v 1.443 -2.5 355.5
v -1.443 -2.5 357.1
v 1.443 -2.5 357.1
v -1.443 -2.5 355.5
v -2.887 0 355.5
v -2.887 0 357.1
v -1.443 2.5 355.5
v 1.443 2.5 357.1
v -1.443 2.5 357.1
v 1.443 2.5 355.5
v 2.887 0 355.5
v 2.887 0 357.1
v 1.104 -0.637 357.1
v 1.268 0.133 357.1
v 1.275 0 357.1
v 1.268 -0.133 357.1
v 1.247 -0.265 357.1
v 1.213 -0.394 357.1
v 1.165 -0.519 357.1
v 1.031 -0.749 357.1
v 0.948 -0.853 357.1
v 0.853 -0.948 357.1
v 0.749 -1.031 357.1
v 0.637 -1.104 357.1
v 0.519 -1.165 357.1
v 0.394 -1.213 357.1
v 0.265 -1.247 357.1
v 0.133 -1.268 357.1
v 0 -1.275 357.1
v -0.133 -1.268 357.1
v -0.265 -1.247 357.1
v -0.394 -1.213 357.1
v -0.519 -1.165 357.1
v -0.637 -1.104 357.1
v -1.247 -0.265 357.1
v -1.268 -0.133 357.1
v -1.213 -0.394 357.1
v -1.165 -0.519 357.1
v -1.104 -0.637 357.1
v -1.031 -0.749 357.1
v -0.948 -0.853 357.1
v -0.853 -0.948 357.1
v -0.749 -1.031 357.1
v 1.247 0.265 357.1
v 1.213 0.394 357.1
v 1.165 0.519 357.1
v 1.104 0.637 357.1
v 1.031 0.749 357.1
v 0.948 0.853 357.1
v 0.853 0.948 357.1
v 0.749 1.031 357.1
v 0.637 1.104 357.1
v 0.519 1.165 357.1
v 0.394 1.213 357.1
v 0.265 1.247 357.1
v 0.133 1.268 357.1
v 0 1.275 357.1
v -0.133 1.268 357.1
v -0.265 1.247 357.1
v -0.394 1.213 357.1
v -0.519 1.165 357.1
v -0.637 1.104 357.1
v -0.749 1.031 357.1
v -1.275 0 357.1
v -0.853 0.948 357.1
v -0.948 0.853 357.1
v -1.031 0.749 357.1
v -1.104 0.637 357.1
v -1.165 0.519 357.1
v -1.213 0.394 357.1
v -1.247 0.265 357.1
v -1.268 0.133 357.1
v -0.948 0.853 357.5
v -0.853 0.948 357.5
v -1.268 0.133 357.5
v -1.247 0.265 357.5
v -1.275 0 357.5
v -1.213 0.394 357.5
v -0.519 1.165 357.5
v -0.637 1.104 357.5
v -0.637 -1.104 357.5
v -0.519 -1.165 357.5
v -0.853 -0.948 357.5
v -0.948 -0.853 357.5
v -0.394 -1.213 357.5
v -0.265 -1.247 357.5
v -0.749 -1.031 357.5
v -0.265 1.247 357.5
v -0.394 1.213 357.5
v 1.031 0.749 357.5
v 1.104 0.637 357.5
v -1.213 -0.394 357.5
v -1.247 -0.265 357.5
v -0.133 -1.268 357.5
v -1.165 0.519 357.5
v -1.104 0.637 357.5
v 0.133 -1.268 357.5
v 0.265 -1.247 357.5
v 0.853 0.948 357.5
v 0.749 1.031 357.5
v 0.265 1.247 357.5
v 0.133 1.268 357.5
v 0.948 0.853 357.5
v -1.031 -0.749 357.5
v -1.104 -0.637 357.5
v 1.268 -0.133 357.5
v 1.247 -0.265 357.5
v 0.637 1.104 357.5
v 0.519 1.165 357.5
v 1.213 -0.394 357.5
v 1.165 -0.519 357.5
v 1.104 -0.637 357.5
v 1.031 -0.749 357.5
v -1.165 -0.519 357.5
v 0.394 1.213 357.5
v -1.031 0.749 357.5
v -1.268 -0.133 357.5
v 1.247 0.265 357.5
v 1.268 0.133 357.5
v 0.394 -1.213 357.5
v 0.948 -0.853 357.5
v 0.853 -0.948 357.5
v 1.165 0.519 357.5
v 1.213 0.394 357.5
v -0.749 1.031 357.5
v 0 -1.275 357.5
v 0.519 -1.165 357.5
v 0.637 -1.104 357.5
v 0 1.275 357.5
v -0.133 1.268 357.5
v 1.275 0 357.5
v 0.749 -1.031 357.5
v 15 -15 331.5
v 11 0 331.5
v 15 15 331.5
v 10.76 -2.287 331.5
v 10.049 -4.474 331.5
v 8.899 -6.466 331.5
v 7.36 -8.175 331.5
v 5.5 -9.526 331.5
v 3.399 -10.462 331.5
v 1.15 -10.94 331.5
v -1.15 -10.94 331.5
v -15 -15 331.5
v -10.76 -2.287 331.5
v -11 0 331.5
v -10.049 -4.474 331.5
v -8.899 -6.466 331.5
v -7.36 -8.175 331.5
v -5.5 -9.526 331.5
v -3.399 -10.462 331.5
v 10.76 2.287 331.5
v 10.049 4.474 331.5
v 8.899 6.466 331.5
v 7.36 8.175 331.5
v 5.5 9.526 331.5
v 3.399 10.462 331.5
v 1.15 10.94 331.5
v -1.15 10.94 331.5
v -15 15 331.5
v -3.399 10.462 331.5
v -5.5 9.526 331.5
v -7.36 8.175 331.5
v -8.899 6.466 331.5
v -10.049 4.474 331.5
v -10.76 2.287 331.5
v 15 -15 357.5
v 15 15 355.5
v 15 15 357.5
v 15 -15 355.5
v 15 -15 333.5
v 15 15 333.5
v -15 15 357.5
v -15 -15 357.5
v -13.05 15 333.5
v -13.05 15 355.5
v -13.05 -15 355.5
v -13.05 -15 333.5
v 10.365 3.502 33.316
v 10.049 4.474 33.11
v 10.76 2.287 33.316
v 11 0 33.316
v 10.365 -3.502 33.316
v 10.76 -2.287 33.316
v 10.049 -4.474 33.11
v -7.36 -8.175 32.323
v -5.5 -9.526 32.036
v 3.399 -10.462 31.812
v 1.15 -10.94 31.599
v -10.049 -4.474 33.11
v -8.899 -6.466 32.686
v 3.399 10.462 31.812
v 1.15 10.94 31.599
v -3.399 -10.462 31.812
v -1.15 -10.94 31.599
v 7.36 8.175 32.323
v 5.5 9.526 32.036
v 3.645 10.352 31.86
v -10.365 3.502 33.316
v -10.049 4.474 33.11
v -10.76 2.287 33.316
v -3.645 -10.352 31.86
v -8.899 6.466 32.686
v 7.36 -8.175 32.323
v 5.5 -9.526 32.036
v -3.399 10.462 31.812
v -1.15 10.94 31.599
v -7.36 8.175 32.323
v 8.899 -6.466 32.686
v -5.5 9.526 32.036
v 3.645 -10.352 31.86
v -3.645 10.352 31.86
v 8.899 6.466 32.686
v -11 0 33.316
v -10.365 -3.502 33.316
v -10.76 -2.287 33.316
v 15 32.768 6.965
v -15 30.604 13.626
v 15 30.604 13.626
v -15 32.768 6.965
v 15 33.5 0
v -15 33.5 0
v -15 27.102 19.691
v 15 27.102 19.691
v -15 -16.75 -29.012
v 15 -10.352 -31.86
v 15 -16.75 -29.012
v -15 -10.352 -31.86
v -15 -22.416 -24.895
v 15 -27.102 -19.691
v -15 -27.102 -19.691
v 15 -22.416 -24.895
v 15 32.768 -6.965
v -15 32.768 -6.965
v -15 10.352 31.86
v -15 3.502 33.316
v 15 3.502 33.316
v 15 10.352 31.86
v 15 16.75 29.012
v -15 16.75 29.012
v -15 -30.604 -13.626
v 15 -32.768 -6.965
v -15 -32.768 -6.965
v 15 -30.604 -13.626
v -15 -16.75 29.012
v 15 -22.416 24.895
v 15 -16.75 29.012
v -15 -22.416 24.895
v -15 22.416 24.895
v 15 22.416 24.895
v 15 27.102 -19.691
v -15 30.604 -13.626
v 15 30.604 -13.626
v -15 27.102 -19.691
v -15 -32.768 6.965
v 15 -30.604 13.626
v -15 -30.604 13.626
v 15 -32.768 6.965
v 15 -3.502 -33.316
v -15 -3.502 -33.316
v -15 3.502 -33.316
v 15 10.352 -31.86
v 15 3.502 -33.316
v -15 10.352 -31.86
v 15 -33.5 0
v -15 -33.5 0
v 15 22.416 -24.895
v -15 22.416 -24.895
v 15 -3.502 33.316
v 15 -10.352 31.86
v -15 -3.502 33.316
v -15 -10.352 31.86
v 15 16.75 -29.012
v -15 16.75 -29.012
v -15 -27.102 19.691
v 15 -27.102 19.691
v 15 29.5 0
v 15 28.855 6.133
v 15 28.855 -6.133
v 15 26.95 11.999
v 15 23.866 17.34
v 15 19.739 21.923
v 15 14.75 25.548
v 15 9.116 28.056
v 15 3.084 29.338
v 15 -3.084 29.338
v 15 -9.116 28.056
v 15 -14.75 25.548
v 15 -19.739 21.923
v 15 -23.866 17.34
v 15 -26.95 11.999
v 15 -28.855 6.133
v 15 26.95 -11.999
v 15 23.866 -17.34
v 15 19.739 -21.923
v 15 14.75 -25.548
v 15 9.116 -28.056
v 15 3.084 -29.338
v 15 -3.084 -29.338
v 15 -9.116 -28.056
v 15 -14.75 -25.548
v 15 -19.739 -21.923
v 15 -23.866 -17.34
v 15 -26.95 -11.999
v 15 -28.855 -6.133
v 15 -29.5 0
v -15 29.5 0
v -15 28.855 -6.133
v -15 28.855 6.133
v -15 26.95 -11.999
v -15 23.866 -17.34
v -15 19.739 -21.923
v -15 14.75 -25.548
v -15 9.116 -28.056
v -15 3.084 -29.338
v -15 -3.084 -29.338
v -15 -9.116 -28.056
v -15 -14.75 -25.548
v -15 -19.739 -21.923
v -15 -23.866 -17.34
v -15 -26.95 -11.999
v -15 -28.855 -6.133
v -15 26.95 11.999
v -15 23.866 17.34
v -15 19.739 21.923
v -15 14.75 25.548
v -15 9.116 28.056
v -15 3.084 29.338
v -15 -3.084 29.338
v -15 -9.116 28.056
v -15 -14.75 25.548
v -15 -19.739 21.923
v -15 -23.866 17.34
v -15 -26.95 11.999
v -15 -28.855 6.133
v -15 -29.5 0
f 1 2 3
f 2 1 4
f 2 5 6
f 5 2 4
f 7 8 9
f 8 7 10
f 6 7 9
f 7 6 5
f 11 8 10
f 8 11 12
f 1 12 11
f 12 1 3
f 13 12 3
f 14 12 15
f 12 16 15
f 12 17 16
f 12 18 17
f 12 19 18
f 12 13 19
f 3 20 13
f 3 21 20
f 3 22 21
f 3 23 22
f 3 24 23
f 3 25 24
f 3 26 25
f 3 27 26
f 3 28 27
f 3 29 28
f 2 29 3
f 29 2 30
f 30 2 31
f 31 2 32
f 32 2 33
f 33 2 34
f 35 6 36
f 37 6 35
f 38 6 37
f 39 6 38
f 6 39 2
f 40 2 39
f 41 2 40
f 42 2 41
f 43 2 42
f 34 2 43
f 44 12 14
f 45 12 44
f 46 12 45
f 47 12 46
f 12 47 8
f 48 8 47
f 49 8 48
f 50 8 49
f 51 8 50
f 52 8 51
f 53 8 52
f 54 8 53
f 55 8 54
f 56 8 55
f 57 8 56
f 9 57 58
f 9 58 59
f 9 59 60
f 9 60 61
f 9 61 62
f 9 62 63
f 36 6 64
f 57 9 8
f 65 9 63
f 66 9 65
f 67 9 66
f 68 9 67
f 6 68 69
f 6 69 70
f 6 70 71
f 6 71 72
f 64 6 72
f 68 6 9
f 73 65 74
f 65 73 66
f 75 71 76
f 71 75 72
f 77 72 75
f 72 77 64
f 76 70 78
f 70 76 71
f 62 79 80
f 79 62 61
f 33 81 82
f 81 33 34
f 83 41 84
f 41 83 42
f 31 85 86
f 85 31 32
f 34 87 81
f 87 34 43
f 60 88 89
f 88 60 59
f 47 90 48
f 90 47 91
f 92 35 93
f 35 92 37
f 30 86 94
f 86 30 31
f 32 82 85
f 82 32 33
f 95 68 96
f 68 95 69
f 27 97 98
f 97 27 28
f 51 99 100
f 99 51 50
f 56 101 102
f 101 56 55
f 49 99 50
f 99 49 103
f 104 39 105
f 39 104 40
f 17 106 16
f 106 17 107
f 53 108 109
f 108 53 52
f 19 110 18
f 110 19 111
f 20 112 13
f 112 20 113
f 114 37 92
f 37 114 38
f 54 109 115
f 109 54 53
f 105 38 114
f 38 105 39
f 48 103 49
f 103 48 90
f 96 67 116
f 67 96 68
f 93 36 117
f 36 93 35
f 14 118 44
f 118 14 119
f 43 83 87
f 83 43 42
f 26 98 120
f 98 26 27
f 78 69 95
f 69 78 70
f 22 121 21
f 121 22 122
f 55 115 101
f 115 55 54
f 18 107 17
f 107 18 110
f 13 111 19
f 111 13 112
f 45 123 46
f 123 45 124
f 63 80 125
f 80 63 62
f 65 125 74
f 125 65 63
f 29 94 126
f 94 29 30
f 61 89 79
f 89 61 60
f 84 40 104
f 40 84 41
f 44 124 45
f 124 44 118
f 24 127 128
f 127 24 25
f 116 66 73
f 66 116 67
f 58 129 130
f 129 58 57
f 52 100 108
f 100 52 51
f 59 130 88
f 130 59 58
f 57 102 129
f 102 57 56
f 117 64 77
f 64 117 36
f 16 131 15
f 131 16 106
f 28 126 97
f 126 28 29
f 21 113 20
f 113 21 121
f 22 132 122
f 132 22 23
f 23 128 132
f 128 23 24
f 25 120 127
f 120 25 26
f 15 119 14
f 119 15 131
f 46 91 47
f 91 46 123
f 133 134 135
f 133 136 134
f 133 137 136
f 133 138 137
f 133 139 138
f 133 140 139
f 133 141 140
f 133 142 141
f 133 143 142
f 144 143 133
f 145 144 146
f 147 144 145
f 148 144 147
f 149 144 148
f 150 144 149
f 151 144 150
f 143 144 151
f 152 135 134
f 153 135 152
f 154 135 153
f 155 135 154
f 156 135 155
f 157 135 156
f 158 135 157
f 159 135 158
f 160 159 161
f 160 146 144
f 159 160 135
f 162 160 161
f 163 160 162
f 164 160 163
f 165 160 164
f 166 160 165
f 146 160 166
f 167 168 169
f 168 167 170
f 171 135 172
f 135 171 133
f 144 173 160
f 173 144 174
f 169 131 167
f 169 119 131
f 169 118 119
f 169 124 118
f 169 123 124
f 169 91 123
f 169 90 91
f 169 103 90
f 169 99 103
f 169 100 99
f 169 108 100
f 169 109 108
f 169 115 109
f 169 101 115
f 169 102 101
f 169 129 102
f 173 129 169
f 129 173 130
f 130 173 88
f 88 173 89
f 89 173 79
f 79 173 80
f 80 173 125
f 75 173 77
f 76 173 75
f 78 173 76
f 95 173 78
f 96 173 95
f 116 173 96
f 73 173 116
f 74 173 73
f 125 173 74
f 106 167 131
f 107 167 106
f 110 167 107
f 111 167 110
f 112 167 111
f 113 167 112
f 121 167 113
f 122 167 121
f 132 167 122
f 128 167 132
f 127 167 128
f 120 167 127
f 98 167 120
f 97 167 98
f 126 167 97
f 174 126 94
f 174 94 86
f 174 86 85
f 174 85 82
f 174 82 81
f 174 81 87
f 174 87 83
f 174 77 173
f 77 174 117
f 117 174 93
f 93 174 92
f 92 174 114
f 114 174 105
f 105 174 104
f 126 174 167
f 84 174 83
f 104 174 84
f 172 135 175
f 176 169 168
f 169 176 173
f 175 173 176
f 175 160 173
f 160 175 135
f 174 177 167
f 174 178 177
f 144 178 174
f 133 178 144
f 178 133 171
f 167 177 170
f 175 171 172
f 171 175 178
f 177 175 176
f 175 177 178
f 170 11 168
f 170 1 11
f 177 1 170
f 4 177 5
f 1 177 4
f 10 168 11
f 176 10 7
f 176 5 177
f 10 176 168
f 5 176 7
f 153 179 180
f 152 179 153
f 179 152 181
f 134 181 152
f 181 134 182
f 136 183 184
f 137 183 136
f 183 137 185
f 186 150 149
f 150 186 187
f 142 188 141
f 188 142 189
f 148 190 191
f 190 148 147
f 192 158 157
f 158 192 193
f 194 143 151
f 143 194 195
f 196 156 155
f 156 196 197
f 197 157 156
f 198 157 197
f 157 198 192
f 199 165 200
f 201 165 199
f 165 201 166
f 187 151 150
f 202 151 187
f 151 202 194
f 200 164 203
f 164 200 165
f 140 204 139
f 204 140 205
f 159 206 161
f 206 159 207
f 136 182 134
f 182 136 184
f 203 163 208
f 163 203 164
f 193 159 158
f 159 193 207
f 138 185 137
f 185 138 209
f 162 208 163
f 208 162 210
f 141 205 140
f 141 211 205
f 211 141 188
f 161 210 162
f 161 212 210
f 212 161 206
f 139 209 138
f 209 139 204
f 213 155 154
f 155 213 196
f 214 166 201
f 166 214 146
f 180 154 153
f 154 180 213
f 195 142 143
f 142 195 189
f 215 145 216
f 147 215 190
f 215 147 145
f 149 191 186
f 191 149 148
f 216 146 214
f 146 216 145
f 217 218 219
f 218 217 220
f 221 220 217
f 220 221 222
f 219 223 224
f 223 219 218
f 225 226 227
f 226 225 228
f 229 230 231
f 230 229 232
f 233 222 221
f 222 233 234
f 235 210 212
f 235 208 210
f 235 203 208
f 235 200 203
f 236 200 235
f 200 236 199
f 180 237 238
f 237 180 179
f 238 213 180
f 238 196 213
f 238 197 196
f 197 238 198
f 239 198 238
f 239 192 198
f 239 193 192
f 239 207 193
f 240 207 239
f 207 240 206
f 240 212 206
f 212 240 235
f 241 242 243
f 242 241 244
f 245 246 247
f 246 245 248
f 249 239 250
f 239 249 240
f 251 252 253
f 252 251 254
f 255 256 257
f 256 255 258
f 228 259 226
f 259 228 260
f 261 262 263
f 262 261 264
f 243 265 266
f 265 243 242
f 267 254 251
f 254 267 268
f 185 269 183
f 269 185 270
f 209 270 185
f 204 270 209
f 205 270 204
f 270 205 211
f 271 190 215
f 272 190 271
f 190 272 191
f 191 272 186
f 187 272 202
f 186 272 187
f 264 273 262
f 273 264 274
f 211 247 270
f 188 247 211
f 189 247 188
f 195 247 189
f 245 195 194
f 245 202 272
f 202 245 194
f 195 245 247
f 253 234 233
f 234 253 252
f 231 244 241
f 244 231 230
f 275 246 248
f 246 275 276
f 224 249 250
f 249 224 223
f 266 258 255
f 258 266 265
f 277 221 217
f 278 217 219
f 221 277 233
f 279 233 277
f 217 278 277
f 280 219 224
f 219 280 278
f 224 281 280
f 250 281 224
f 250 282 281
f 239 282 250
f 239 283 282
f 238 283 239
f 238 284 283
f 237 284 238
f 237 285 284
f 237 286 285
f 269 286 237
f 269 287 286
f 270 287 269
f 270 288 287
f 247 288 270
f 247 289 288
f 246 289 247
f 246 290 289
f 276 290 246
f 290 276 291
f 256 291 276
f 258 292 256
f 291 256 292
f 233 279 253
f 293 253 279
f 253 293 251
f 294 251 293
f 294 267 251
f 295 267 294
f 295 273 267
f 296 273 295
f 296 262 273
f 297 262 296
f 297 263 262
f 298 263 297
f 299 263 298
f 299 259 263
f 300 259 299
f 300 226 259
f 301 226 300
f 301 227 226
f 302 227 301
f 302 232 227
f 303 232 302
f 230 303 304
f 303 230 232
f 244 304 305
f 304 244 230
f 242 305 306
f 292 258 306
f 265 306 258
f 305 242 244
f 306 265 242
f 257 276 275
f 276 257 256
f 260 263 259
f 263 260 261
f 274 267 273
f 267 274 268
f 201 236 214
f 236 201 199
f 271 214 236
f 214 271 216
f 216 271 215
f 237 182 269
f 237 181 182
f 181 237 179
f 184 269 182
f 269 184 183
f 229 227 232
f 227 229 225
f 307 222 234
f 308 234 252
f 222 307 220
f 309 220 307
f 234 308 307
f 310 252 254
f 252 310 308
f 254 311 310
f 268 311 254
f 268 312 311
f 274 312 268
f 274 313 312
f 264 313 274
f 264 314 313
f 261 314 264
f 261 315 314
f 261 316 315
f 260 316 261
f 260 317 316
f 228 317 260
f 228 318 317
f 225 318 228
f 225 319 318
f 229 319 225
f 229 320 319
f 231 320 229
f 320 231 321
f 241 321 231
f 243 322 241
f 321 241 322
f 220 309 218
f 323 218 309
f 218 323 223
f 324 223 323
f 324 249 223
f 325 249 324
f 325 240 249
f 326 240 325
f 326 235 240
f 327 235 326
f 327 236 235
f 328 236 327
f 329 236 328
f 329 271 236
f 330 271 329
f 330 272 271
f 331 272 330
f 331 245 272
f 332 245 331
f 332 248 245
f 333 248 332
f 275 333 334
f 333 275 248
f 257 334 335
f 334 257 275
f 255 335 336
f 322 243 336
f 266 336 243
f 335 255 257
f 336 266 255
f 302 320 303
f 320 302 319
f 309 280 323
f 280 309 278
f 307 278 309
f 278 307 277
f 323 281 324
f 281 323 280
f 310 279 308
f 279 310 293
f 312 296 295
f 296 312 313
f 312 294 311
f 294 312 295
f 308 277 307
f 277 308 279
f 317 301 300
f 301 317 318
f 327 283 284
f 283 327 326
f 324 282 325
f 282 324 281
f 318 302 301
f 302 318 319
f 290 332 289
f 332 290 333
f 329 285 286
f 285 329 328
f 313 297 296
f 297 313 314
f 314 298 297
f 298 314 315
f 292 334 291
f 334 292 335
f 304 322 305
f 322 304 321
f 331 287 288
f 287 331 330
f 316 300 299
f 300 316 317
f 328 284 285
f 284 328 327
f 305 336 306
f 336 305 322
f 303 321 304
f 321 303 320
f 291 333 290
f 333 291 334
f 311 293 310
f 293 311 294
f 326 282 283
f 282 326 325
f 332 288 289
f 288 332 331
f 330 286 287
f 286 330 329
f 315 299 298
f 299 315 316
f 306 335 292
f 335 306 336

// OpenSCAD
FUZZ = 0.1;
THICKNESS = 2;
BRACKET_HEIGHT = 26;
BRACKET_DEPTH = 30;
PILLAR_HEIGHT = 300;
TUBE_RADIUS = 29.5;
HOSE_BRACKET_ANGLE = 90;
WIDTH = 30;
SCREW_DIAMETER = 2.5;
NUT_HEIGHT = 1.6;

module flat_nut(dia, height)
{
  out_h = 2*dia;
  out_r = out_h/sqrt(3);
	difference()
	{
		cylinder(r=out_r,h=height,$fn=6, center=true);
    cylinder(r=dia/2,h=height+FUZZ, $fn=60, center=true);
	}
}

module bracket(h, w, d) {
  difference() {
    cube([h, w, d], center=true);
    translate([0, 0, THICKNESS/2])
      cube([h-THICKNESS*2, w+2*FUZZ, d-THICKNESS+FUZZ], center=true);
    translate([-h/2+THICKNESS-NUT_HEIGHT/2+FUZZ/2,0,0])
        rotate([0,90,0]) {
         flat_nut(SCREW_DIAMETER, NUT_HEIGHT+FUZZ);
         translate([0,0,-NUT_HEIGHT/2])
          cylinder(d=SCREW_DIAMETER+FUZZ/2, h=2*THICKNESS, $fn=60, center=true);
      }
  }
}

module pillar(r, h) {
  cylinder(h, r=r);
}

module tube_collar(r, d) {
  difference() {
    cylinder(d, r=r+THICKNESS*2, center=true);
    cylinder(d+FUZZ, r=r, center=true);
  }
}

module main(bracket_h, bracket_d, pillar_h, tube_r, hose_bracket_angle) {
  translate([0, 0, tube_r+THICKNESS]) {
    translate([0,0,pillar_h+bracket_h/2])
      rotate([0,90,0])
        bracket(bracket_h, WIDTH, bracket_d, screw_d);
    pillar(WIDTH/2-THICKNESS*2, pillar_h);
  }
  rotate([90, 0, hose_bracket_angle])
    tube_collar(tube_r, WIDTH);
}

main(BRACKET_HEIGHT, BRACKET_DEPTH, PILLAR_HEIGHT, TUBE_RADIUS, HOSE_BRACKET_ANGLE);
